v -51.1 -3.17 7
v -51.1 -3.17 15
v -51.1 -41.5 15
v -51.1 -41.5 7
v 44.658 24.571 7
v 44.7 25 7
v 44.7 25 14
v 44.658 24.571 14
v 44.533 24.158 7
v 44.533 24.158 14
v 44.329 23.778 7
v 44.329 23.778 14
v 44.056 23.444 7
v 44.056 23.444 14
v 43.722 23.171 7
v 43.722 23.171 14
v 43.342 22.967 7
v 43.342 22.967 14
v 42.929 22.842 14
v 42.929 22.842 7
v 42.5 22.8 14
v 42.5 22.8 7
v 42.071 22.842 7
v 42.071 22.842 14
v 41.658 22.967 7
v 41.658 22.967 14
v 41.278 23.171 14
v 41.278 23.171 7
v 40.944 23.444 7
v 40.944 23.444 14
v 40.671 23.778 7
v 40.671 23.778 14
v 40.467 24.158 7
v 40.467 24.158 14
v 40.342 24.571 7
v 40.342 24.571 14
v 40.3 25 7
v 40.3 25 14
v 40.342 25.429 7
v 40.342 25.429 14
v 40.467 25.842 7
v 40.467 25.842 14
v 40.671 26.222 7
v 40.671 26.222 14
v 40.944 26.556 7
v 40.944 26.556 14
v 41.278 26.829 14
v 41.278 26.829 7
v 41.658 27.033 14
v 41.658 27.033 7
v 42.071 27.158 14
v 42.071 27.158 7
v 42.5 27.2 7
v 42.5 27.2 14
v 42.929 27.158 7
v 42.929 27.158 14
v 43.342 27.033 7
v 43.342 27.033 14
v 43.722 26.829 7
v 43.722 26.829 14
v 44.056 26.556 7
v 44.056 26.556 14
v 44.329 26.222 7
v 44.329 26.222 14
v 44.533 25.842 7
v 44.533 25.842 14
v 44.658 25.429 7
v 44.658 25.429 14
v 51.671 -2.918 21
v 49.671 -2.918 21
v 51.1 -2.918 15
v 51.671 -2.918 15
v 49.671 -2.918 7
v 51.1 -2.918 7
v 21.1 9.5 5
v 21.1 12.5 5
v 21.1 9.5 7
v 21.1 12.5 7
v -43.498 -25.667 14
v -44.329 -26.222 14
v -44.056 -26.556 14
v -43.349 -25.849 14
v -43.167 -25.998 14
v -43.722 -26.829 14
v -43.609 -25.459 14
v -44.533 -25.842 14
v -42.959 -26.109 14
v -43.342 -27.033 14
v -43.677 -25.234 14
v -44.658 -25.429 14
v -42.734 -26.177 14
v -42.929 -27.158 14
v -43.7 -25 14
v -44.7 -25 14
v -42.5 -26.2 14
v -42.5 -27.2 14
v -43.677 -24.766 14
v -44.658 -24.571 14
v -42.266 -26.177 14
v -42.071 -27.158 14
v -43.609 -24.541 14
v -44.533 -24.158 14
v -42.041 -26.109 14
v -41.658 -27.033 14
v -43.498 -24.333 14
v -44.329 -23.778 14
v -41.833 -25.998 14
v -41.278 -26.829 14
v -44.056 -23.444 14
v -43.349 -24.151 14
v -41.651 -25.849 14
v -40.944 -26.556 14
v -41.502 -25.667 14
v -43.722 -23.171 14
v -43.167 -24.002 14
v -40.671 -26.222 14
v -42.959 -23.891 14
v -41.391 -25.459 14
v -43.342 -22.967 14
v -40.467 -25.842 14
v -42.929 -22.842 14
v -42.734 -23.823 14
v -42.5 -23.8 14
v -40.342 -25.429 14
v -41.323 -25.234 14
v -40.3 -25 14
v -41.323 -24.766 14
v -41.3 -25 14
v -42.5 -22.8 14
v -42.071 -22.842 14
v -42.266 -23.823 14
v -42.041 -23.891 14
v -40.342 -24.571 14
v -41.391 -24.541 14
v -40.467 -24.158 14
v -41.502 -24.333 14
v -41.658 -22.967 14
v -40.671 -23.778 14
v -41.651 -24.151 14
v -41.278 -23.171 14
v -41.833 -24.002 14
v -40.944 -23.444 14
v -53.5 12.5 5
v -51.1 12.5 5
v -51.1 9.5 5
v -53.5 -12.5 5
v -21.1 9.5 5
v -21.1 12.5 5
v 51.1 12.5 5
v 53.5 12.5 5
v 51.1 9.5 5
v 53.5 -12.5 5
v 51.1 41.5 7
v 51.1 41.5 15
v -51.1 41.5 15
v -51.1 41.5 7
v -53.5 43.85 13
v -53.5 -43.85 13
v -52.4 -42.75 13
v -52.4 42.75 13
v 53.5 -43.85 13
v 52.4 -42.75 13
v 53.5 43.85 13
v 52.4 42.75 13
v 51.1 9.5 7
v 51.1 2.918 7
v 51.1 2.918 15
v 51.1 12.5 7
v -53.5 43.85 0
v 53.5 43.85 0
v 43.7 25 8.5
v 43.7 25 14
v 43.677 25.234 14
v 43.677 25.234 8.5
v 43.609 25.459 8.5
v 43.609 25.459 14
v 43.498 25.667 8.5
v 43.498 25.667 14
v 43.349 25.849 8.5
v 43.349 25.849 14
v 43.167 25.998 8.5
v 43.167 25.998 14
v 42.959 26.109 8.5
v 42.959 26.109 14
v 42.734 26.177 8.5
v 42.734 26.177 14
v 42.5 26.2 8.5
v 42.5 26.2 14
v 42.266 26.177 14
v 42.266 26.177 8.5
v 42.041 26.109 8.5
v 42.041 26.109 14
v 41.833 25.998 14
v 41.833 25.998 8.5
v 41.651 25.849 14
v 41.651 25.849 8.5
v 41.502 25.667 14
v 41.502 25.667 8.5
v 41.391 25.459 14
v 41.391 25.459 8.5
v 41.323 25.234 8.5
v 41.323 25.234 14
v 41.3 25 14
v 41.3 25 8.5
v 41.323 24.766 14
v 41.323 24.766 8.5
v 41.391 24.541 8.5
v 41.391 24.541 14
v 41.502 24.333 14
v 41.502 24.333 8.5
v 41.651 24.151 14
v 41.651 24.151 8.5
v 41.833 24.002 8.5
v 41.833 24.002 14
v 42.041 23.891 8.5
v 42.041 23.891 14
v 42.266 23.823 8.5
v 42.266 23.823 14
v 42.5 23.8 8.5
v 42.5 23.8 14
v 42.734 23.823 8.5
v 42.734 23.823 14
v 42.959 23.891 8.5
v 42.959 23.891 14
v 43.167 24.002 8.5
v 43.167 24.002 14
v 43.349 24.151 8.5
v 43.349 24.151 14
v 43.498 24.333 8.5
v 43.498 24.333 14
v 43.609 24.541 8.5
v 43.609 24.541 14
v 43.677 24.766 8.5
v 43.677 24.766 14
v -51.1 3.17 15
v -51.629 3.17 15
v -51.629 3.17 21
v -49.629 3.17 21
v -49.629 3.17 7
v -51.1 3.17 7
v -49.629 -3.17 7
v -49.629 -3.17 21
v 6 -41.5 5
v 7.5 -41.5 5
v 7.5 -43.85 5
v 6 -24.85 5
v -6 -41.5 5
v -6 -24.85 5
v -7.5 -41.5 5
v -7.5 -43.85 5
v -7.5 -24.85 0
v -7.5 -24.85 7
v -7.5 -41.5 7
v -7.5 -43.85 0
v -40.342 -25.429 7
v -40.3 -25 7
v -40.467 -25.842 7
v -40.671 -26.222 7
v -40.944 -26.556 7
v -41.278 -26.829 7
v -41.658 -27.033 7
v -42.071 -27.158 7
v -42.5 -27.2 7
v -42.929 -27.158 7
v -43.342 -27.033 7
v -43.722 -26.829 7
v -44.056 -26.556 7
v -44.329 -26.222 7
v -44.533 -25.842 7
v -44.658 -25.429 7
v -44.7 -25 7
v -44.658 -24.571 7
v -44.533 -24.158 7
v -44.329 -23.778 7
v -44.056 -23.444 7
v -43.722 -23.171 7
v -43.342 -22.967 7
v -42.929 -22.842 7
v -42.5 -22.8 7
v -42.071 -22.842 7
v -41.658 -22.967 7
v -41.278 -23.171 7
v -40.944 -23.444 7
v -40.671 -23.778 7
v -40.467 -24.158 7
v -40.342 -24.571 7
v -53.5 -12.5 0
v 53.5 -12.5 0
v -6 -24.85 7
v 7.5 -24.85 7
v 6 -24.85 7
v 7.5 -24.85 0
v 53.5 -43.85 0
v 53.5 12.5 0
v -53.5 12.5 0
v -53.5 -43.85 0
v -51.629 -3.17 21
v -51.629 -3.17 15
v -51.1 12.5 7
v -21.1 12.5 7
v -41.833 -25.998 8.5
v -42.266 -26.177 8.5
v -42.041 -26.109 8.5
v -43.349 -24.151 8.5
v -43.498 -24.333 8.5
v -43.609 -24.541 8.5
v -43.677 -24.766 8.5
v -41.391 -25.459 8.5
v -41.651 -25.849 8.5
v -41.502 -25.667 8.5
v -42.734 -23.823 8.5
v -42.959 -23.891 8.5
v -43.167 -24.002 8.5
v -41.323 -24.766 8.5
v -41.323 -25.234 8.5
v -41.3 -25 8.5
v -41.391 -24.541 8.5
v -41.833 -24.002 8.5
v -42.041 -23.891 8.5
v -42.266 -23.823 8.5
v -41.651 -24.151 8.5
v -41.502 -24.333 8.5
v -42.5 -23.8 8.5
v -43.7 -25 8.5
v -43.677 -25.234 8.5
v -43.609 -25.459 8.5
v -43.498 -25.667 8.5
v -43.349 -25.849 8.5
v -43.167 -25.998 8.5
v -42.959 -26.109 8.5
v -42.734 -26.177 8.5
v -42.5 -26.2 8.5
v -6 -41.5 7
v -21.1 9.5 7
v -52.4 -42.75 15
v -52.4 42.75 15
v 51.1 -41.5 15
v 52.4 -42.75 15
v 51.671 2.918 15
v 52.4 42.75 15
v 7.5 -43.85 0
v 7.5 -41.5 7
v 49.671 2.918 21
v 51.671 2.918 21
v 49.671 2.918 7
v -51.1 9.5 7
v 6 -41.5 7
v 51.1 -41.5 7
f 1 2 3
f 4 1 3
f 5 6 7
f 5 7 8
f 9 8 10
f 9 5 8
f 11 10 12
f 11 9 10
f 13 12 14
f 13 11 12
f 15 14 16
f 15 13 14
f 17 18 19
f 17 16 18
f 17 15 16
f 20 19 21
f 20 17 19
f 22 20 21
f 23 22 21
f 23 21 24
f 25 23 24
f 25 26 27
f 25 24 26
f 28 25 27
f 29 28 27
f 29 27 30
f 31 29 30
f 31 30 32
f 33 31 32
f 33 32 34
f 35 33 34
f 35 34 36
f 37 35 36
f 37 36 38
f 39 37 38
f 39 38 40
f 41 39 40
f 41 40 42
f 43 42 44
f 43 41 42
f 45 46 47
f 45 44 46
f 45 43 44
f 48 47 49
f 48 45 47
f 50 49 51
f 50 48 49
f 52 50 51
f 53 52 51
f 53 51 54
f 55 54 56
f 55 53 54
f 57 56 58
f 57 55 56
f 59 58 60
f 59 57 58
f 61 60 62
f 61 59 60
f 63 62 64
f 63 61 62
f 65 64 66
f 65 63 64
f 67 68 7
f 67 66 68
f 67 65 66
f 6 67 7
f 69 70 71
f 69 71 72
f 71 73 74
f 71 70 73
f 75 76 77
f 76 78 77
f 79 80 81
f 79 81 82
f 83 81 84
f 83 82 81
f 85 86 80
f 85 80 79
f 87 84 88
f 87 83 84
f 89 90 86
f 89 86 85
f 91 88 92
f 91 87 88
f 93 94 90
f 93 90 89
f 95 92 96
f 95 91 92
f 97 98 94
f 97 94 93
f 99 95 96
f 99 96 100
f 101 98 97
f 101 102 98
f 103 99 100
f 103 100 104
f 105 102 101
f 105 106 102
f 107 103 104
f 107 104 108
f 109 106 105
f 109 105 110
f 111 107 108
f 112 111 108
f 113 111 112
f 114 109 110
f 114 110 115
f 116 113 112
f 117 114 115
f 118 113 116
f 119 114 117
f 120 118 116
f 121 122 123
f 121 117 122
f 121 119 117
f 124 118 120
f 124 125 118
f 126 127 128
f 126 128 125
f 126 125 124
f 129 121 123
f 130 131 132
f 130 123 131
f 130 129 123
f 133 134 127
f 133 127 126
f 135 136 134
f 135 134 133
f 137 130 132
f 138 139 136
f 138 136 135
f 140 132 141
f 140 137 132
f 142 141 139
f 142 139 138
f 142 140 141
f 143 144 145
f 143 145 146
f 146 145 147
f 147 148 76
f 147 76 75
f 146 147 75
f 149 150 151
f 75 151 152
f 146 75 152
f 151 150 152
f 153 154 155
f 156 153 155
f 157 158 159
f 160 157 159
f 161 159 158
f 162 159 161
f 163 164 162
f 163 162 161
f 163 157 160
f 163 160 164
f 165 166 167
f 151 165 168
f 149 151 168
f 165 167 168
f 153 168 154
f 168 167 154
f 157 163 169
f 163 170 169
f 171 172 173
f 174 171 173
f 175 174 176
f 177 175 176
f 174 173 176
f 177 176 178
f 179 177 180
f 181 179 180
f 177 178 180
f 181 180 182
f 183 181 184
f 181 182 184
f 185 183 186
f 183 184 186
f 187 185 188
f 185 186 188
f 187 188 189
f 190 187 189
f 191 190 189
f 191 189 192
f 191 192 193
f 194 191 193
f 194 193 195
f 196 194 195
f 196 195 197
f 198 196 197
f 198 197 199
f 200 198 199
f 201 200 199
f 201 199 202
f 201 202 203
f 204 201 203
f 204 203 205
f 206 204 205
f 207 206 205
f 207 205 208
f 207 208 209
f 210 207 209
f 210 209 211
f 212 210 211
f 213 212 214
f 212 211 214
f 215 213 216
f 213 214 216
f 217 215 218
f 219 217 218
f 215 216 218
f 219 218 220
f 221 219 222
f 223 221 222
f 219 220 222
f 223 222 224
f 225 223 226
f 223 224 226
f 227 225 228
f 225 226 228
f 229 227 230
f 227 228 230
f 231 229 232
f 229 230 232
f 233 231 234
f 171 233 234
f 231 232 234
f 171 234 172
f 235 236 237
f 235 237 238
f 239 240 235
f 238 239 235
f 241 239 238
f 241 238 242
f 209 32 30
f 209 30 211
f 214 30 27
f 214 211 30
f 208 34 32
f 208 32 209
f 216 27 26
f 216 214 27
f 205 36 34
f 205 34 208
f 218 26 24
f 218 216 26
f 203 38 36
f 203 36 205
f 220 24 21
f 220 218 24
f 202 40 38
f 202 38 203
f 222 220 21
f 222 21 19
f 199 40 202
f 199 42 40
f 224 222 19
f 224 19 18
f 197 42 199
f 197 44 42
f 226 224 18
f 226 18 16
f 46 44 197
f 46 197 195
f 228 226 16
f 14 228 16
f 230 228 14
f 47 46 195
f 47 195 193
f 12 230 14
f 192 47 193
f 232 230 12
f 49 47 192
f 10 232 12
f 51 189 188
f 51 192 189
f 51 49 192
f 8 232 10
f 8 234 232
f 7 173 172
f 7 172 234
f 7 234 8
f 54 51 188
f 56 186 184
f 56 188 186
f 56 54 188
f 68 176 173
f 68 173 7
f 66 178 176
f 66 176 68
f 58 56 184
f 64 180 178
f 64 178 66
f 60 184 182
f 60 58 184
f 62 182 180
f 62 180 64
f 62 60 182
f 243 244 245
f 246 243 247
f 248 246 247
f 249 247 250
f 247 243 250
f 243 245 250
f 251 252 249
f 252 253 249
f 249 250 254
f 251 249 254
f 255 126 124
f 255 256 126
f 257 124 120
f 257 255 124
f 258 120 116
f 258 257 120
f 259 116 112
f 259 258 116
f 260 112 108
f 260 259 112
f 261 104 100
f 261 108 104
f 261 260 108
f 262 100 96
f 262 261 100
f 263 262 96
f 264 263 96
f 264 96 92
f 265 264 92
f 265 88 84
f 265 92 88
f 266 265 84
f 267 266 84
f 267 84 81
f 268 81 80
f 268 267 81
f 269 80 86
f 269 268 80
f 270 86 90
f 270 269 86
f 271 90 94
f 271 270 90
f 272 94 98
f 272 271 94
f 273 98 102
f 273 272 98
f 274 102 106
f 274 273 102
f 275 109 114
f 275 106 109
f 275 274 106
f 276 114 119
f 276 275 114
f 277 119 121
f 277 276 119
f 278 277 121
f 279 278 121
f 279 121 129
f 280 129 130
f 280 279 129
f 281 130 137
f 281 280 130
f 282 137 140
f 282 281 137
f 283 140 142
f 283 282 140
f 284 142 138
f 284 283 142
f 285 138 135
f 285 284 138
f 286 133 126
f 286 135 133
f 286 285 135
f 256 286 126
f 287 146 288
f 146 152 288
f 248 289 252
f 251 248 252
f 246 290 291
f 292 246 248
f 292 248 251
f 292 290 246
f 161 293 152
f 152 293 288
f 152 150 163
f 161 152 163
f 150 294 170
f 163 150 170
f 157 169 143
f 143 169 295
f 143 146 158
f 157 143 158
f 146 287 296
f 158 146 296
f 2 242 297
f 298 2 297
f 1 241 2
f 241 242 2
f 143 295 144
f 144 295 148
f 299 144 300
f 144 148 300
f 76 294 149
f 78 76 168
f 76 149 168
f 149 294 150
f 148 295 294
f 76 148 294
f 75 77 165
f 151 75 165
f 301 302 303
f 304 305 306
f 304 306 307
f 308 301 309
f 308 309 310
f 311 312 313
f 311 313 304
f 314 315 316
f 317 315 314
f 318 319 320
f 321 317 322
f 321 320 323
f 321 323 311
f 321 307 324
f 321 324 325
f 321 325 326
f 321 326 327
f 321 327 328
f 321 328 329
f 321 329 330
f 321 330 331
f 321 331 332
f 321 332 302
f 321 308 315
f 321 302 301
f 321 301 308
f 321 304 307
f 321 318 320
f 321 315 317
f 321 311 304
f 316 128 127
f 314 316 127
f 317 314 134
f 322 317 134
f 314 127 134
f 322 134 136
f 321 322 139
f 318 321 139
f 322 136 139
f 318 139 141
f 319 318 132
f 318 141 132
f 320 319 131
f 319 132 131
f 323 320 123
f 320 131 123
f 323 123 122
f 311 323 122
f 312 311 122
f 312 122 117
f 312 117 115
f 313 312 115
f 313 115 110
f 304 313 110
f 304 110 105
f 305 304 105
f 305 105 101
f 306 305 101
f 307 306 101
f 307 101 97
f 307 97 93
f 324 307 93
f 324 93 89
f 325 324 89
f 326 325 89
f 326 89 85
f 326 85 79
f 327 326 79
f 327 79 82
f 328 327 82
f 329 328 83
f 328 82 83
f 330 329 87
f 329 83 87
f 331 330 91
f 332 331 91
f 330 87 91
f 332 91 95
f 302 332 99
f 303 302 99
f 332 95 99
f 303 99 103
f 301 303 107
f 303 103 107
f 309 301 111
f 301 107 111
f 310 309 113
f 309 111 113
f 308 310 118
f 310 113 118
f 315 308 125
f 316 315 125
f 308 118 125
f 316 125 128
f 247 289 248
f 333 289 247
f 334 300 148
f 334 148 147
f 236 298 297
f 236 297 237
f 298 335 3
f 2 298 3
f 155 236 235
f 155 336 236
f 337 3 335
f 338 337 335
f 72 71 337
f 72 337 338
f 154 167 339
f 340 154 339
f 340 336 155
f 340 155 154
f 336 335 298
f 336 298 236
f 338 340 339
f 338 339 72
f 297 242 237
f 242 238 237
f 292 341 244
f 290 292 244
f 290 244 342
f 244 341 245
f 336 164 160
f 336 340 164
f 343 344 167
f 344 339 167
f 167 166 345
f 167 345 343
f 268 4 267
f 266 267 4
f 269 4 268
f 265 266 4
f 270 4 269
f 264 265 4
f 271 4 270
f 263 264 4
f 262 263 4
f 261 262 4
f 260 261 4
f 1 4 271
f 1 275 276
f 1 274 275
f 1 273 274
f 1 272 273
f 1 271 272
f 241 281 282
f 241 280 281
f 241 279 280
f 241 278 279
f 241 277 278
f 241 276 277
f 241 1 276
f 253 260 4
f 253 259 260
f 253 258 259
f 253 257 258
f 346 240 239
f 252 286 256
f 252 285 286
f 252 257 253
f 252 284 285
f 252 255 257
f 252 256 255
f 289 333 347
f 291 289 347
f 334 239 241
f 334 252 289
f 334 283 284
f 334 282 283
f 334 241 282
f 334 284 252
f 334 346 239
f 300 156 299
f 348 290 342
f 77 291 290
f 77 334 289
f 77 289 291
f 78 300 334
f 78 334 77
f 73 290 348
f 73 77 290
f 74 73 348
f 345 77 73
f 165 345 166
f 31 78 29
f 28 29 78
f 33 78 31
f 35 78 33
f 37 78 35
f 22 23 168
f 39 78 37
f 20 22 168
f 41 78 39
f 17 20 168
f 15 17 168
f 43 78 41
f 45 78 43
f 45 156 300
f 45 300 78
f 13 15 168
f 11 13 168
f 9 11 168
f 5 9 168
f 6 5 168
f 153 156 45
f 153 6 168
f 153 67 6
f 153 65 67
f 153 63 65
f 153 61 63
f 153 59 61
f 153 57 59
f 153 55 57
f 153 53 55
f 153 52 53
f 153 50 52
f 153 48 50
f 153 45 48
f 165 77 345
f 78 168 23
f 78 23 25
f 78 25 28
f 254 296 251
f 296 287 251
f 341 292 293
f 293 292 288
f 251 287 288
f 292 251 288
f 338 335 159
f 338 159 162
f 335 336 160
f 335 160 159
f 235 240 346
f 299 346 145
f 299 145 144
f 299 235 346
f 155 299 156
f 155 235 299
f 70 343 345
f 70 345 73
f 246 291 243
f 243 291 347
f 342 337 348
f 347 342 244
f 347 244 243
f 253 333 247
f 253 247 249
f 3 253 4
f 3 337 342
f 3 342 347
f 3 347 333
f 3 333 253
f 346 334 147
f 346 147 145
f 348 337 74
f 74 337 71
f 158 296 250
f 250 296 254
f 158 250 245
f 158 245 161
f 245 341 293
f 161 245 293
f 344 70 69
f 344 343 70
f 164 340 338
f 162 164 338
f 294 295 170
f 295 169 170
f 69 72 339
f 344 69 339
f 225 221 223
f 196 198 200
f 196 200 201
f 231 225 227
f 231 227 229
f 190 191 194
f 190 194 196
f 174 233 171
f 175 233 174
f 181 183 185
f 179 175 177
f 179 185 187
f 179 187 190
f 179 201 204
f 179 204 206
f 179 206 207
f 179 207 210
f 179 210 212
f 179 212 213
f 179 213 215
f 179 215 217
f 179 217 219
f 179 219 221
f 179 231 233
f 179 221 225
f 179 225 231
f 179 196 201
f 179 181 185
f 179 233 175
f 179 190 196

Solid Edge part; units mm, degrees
sketch "Sketch1" plane through (0, 0, 0) normal (0, 0, 1) x (1, 0, 0)
  line L0 (53.5, -43.85) -> (53.5, 43.85)
  line L1 (53.5, 43.85) -> (-53.5, 43.85)
  line L2 (-53.5, 43.85) -> (-53.5, -43.85)
  line L3 (-53.5, -43.85) -> (53.5, -43.85)
extrude "Protrusion1" add sketch "Sketch1" along normal blind 15
sketch "Sketch2" plane through (0, -43.85, 7.5) normal (0, -1, 0) x (1, 0, 0)
  line L0 (7.5, -2.5) -> (-7.5, -2.5)
  line L1 (-7.5, -2.5) -> (-7.5, -12.5)
  line L2 (-7.5, -12.5) -> (7.5, -12.5)
  line L3 (7.5, -12.5) -> (7.5, -2.5)
extrude "VaciadoExtruido_1" cut sketch "Sketch2" against normal blind 19
sketch "Sketch3" plane through (53.5, 0, 7.5) normal (1, 0, 0) x (0, 1, 0)
  line L0 (12.5, -2.5) -> (-12.5, -2.5)
  line L1 (-12.5, -2.5) -> (-12.5, -12.5)
  line L2 (-12.5, -12.5) -> (12.5, -12.5)
  line L3 (12.5, -12.5) -> (12.5, -2.5)
extrude "VaciadoExtruido_2" cut sketch "Sketch3" against normal blind 125.4573
sketch "Sketch4" plane through (0, 0, 15) normal (0, 0, 1) x (1, 0, 0)
  line L0 (51.1, -41.5) -> (51.1, 41.5)
  line L1 (51.1, 41.5) -> (-51.1, 41.5)
  line L2 (-51.1, 41.5) -> (-51.1, -41.5)
  line L3 (-51.1, -41.5) -> (51.1, -41.5)
extrude "VaciadoExtruido_4" cut sketch "Sketch4" against normal blind 8
sketch "Sketch5" plane through (0, 0, 7) normal (0, 0, 1) x (1, 0, 0)
  circle A0 centre (-42.5, -25) radius 2.2
  circle A1 centre (42.5, 25) radius 2.2
  dimension "D1" = 4.4
  dimension "D2" = 25
  dimension "D3" = 42.5
  dimension "D4" = 42.5
  dimension "D5" = 25
extrude "ProtrusiónExtruida_2" add sketch "Sketch5" along normal blind 7
sketch "Sketch6" plane through (0, 0, 7) normal (0, 0, 1) x (-1, 0, 0)
  line L0 (-49.6713, -2.9175) -> (-49.6713, 2.9175)
  line L1 (-49.6713, 2.9175) -> (-51.6713, 2.9175)
  line L2 (-51.6713, 2.9175) -> (-51.6713, -2.9175)
  line L3 (-51.6713, -2.9175) -> (-49.6713, -2.9175)
  line L4 (49.6287, -3.1696) -> (49.6287, 3.1696)
  line L5 (49.6287, 3.1696) -> (51.6287, 3.1696)
  line L6 (51.6287, 3.1696) -> (51.6287, -3.1696)
  line L7 (51.6287, -3.1696) -> (49.6287, -3.1696)
  dimension "D1" = 6.3393
  dimension "D2" = 2
  dimension "D3" = 2
  dimension "D4" = 5.8351
extrude "ProtrusiónExtruida_7" add sketch "Sketch6" along normal blind 14
sketch "Sketch7" plane through (0, 0, 15) normal (0, 0, 1) x (1, 0, 0)
  line L0 (-52.4, 43.85) -> (-52.4, -43.85)
  line L1 (-52.4, -43.85) -> (-53.5, -43.85)
  line L2 (-53.5, -43.85) -> (-53.5, 43.85)
  line L3 (-53.5, 43.85) -> (-52.4, 43.85)
extrude "VaciadoExtruido_12" cut sketch "Sketch7" against normal blind 2
sketch "Sketch8" plane through (0.55, 0, 15) normal (0, 0, 1) x (1, 0, 0)
  line L0 (-52.95, -42.75) -> (52.95, -42.75)
  line L1 (52.95, -42.75) -> (52.95, -43.85)
  line L2 (52.95, -43.85) -> (-52.95, -43.85)
  line L3 (-52.95, -43.85) -> (-52.95, -42.75)
extrude "VaciadoExtruido_14" cut sketch "Sketch8" against normal blind 2
sketch "Sketch9" plane through (0.55, 0.55, 15) normal (0, 0, 1) x (1, 0, 0)
  line L0 (52.95, 43.3) -> (51.85, 43.3)
  line L1 (51.85, 43.3) -> (51.85, -43.3)
  line L2 (51.85, -43.3) -> (52.95, -43.3)
  line L3 (52.95, -43.3) -> (52.95, 43.3)
extrude "VaciadoExtruido_15" cut sketch "Sketch9" against normal blind 2
sketch "Sketch10" plane through (0, 0.55, 15) normal (0, 0, 1) x (1, 0, 0)
  line L0 (-52.4, 43.3) -> (52.4, 43.3)
  line L1 (52.4, 43.3) -> (52.4, 42.2)
  line L2 (52.4, 42.2) -> (-52.4, 42.2)
  line L3 (-52.4, 42.2) -> (-52.4, 43.3)
extrude "VaciadoExtruido_16" cut sketch "Sketch10" against normal blind 2
sketch "Sketch11" plane through (0, 0, 7) normal (0, 0, 1) x (1, 0, 0)
  line L0 (7.5, -41.5) -> (7.5, -24.85)
  line L1 (7.5, -24.85) -> (6, -24.85)
  line L2 (6, -24.85) -> (6, -41.5)
  line L3 (6, -41.5) -> (7.5, -41.5)
  line L4 (-6, -24.85) -> (-6, -41.5)
  line L5 (-6, -41.5) -> (-7.5, -41.5)
  line L6 (-7.5, -41.5) -> (-7.5, -24.85)
  line L7 (-7.5, -24.85) -> (-6, -24.85)
  dimension "D1" = 1.5
  dimension "D2" = 1.5
extrude "VaciadoExtruido_17" cut sketch "Sketch11" against normal blind 21
sketch "Sketch12" plane through (0, 0, 7) normal (0, 0, 1) x (1, 0, 0)
  line L0 (-51.1, 12.5) -> (-21.1, 12.5)
  line L1 (-21.1, 12.5) -> (-21.1, 9.5)
  line L2 (-21.1, 9.5) -> (-51.1, 9.5)
  line L3 (-51.1, 9.5) -> (-51.1, 12.5)
  line L4 (51.1, 12.5) -> (21.1, 12.5)
  line L5 (21.1, 12.5) -> (21.1, 9.5)
  line L6 (21.1, 9.5) -> (51.1, 9.5)
  line L7 (51.1, 9.5) -> (51.1, 12.5)
  dimension "D1" = 30
  dimension "D2" = 30
  dimension "D3" = 3
  dimension "D4" = 3
extrude "VaciadoExtruido_18" cut sketch "Sketch12" against normal blind 84
sketch "Sketch13" plane through (-42.5, -25, 14) normal (0, 0, 1) x (1, 0, 0)
  circle A0 centre (0, 0) radius 1.2
  circle A1 centre (85, 50) radius 1.2
  dimension "D1" = 2.4
  dimension "D2" = 2.4
extrude "VaciadoExtruido_19" cut sketch "Sketch13" against normal blind 5.5
